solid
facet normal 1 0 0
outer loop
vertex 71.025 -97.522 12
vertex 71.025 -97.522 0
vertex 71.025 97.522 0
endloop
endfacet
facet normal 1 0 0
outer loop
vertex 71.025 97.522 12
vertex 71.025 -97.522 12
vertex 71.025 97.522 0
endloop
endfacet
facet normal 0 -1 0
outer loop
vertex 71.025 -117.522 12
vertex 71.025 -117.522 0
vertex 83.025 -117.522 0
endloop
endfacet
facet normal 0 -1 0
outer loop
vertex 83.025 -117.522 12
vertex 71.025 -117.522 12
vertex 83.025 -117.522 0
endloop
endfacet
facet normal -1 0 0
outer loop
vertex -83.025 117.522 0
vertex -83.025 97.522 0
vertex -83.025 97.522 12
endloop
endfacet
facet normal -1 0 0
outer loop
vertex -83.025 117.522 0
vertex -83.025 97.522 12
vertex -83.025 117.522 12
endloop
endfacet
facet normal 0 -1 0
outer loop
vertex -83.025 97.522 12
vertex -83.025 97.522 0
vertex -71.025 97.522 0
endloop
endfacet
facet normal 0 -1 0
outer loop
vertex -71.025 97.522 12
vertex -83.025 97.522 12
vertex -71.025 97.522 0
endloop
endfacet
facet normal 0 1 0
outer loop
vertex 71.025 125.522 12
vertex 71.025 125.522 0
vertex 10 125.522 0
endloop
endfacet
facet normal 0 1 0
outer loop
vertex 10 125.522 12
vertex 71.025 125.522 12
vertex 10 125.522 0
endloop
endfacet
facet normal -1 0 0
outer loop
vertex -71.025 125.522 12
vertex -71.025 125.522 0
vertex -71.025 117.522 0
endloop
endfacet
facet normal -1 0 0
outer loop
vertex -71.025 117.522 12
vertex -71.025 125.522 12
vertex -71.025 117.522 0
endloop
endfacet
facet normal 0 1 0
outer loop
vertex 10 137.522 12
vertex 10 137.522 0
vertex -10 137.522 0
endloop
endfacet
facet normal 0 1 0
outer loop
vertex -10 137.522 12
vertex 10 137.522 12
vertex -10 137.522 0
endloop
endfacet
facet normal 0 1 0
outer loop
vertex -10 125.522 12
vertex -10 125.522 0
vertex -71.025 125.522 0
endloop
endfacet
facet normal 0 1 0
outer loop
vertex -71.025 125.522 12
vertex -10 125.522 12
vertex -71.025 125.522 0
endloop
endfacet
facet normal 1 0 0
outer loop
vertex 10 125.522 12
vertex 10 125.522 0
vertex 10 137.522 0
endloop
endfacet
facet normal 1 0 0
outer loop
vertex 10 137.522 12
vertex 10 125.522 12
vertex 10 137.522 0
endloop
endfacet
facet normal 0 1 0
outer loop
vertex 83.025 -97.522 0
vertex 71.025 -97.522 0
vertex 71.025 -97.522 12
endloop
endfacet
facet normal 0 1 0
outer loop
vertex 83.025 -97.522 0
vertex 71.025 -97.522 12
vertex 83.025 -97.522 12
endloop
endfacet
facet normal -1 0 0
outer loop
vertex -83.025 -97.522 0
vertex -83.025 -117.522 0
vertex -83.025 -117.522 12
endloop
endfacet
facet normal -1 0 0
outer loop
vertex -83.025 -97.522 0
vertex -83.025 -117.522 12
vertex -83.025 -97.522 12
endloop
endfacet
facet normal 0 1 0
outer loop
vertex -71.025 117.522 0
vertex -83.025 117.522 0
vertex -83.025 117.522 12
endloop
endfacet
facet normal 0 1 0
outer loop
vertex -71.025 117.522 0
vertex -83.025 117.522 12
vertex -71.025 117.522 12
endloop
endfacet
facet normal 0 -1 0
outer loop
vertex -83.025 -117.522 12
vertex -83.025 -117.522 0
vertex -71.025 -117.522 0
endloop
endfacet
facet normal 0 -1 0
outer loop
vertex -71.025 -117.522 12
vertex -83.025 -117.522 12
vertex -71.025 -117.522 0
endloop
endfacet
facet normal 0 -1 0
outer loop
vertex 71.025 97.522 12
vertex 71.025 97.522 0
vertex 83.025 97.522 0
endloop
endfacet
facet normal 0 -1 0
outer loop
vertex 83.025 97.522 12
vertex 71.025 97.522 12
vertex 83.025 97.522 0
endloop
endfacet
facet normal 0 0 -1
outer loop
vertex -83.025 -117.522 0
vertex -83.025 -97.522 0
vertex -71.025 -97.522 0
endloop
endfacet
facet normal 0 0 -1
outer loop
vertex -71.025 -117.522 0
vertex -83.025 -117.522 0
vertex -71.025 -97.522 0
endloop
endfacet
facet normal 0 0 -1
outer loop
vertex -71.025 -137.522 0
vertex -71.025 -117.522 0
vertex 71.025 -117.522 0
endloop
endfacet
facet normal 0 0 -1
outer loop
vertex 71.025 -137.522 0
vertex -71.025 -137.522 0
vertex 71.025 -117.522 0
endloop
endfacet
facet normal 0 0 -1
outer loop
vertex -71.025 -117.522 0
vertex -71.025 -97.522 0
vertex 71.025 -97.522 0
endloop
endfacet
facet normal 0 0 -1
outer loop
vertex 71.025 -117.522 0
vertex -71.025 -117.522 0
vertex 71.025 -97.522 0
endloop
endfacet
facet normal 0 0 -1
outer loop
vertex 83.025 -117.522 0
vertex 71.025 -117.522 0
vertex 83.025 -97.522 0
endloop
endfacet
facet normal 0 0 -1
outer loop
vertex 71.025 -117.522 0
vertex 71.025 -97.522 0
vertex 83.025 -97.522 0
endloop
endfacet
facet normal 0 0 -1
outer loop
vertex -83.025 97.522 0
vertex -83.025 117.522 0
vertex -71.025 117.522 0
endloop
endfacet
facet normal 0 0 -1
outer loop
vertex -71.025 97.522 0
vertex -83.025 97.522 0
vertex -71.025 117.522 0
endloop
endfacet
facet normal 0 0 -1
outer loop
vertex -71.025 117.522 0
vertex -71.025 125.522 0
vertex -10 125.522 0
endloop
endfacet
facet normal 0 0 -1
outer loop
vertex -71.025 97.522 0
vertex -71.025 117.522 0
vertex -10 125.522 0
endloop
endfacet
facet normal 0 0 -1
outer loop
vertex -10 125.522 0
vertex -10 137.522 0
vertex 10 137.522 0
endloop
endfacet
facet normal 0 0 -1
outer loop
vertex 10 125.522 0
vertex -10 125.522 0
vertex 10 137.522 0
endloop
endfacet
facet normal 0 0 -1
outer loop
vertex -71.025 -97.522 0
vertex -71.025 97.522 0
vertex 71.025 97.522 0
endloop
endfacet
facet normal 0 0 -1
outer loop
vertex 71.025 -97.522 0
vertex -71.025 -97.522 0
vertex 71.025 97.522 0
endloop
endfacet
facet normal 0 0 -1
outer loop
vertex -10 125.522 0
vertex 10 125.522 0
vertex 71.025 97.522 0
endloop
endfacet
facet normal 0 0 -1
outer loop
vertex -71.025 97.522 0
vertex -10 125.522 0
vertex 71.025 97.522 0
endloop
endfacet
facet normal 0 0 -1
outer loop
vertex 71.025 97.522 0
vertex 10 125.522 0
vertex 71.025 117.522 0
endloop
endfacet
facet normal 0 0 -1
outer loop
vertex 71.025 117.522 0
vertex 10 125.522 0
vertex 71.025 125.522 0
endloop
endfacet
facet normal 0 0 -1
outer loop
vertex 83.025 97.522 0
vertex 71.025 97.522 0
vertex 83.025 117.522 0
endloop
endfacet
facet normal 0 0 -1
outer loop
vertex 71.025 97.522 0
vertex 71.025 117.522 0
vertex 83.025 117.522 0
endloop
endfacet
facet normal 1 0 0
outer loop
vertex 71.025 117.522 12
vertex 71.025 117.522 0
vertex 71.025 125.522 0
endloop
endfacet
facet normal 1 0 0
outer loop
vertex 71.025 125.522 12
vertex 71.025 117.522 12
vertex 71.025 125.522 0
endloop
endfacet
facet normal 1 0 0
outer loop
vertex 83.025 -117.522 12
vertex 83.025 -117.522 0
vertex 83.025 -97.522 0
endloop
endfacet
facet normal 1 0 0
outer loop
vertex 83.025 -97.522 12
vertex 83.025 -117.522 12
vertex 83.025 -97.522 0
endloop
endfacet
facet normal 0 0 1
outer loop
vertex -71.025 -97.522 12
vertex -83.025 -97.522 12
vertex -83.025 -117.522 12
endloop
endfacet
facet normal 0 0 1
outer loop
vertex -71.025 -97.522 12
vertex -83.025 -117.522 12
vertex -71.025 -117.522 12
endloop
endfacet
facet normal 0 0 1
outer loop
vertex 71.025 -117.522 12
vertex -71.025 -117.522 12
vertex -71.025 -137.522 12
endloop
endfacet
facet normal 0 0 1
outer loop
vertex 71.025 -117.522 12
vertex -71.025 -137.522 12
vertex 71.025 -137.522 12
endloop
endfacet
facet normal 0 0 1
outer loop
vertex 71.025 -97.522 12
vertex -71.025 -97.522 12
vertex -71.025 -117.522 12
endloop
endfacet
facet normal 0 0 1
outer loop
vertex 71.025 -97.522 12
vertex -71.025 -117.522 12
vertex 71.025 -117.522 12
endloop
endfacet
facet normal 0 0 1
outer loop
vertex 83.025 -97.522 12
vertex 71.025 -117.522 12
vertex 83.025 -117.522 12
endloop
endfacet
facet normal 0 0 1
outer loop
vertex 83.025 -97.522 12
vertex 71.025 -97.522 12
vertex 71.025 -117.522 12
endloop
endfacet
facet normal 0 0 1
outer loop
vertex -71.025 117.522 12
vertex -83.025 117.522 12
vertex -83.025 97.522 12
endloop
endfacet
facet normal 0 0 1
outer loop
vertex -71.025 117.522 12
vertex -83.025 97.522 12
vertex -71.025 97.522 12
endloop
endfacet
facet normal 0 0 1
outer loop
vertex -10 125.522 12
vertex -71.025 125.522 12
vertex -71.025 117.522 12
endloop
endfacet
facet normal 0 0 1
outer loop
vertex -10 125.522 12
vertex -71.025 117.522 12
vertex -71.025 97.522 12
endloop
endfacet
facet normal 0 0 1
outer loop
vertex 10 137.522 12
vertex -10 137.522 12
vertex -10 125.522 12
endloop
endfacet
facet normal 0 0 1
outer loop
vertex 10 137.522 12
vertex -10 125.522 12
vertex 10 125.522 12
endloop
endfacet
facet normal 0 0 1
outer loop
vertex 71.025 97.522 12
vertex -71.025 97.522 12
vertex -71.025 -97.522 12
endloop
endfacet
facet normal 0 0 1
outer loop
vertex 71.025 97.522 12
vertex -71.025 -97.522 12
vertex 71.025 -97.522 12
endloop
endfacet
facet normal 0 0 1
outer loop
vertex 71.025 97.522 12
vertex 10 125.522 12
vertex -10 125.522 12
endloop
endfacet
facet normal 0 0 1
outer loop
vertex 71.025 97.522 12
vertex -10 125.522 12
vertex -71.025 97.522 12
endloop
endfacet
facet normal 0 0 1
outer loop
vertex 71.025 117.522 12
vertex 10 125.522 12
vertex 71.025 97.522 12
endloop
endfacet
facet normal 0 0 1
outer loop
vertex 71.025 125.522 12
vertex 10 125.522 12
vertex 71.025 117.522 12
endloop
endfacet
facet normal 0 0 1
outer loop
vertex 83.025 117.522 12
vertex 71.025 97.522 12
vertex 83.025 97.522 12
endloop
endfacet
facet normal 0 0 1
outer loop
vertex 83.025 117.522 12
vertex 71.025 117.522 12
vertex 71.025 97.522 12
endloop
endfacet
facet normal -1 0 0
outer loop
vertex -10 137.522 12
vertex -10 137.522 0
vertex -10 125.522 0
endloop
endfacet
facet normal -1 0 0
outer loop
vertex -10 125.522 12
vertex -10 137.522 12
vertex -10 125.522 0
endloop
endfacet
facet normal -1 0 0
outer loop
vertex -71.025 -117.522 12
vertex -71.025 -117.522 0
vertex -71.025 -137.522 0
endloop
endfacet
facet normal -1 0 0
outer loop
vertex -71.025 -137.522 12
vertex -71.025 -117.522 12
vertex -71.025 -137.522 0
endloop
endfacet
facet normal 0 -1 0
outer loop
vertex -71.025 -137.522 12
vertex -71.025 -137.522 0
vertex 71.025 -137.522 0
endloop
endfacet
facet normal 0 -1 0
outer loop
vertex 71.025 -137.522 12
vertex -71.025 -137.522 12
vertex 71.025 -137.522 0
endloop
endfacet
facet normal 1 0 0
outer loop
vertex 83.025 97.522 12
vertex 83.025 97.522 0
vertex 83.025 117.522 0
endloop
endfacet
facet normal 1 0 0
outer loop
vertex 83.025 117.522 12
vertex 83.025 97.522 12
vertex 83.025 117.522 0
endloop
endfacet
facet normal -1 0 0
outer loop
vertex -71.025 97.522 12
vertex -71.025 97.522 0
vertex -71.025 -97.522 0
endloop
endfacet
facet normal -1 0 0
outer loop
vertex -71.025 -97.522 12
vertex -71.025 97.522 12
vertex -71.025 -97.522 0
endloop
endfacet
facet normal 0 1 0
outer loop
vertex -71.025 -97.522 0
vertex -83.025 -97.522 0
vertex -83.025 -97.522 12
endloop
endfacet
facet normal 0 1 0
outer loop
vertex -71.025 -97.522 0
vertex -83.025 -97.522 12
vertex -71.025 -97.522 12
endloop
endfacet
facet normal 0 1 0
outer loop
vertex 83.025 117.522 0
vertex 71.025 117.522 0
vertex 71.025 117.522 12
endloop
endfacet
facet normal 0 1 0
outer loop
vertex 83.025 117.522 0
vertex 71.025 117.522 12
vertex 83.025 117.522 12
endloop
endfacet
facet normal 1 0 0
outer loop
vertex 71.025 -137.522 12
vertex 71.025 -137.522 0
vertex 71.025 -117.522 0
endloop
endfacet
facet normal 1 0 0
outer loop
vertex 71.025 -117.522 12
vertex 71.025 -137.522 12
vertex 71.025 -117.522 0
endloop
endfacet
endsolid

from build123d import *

# Parameters (mm, degrees)
F0_W     = 12
F0_H     = 20
F1_DEPTH = 12


# Not quite as in the source:
# - a feature names something its author has since deleted; it is built from what else it names


with BuildPart() as f1:
    # F0 (on Top) → F1 (new body)
    with BuildSketch(Plane.XY):
        with Locations((-77.025, 107.52248)):
            Rectangle(F0_W, F0_H)
        Polygon((71.025, 125.52248), (10, 125.52248), (-10, 125.52248), (-71.025, 125.52248), (-71.025, 117.52248), (-71.025, 97.52248), (-71.025, -97.52248), (-71.025, -117.52248), (-71.025, -137.52248), (71.025, -137.52248), (71.025, -117.52248), (71.025, -97.52248), (71.025, 97.52248), (71.025, 117.52248), align=None)
        with Locations((77.025, 107.52248)):
            Rectangle(F0_W, F0_H)
        with Locations((-77.025, -107.52248)):
            Rectangle(F0_W, F0_H)
        with Locations((77.025, -107.52248)):
            Rectangle(F0_W, F0_H)
        Polygon((10, 127.52248), (10, 137.52248), (-10, 137.52248), (-10, 127.52248), (-10, 125.52248), (10, 125.52248), align=None)
    extrude(amount=F1_DEPTH)


solid = f1.part
